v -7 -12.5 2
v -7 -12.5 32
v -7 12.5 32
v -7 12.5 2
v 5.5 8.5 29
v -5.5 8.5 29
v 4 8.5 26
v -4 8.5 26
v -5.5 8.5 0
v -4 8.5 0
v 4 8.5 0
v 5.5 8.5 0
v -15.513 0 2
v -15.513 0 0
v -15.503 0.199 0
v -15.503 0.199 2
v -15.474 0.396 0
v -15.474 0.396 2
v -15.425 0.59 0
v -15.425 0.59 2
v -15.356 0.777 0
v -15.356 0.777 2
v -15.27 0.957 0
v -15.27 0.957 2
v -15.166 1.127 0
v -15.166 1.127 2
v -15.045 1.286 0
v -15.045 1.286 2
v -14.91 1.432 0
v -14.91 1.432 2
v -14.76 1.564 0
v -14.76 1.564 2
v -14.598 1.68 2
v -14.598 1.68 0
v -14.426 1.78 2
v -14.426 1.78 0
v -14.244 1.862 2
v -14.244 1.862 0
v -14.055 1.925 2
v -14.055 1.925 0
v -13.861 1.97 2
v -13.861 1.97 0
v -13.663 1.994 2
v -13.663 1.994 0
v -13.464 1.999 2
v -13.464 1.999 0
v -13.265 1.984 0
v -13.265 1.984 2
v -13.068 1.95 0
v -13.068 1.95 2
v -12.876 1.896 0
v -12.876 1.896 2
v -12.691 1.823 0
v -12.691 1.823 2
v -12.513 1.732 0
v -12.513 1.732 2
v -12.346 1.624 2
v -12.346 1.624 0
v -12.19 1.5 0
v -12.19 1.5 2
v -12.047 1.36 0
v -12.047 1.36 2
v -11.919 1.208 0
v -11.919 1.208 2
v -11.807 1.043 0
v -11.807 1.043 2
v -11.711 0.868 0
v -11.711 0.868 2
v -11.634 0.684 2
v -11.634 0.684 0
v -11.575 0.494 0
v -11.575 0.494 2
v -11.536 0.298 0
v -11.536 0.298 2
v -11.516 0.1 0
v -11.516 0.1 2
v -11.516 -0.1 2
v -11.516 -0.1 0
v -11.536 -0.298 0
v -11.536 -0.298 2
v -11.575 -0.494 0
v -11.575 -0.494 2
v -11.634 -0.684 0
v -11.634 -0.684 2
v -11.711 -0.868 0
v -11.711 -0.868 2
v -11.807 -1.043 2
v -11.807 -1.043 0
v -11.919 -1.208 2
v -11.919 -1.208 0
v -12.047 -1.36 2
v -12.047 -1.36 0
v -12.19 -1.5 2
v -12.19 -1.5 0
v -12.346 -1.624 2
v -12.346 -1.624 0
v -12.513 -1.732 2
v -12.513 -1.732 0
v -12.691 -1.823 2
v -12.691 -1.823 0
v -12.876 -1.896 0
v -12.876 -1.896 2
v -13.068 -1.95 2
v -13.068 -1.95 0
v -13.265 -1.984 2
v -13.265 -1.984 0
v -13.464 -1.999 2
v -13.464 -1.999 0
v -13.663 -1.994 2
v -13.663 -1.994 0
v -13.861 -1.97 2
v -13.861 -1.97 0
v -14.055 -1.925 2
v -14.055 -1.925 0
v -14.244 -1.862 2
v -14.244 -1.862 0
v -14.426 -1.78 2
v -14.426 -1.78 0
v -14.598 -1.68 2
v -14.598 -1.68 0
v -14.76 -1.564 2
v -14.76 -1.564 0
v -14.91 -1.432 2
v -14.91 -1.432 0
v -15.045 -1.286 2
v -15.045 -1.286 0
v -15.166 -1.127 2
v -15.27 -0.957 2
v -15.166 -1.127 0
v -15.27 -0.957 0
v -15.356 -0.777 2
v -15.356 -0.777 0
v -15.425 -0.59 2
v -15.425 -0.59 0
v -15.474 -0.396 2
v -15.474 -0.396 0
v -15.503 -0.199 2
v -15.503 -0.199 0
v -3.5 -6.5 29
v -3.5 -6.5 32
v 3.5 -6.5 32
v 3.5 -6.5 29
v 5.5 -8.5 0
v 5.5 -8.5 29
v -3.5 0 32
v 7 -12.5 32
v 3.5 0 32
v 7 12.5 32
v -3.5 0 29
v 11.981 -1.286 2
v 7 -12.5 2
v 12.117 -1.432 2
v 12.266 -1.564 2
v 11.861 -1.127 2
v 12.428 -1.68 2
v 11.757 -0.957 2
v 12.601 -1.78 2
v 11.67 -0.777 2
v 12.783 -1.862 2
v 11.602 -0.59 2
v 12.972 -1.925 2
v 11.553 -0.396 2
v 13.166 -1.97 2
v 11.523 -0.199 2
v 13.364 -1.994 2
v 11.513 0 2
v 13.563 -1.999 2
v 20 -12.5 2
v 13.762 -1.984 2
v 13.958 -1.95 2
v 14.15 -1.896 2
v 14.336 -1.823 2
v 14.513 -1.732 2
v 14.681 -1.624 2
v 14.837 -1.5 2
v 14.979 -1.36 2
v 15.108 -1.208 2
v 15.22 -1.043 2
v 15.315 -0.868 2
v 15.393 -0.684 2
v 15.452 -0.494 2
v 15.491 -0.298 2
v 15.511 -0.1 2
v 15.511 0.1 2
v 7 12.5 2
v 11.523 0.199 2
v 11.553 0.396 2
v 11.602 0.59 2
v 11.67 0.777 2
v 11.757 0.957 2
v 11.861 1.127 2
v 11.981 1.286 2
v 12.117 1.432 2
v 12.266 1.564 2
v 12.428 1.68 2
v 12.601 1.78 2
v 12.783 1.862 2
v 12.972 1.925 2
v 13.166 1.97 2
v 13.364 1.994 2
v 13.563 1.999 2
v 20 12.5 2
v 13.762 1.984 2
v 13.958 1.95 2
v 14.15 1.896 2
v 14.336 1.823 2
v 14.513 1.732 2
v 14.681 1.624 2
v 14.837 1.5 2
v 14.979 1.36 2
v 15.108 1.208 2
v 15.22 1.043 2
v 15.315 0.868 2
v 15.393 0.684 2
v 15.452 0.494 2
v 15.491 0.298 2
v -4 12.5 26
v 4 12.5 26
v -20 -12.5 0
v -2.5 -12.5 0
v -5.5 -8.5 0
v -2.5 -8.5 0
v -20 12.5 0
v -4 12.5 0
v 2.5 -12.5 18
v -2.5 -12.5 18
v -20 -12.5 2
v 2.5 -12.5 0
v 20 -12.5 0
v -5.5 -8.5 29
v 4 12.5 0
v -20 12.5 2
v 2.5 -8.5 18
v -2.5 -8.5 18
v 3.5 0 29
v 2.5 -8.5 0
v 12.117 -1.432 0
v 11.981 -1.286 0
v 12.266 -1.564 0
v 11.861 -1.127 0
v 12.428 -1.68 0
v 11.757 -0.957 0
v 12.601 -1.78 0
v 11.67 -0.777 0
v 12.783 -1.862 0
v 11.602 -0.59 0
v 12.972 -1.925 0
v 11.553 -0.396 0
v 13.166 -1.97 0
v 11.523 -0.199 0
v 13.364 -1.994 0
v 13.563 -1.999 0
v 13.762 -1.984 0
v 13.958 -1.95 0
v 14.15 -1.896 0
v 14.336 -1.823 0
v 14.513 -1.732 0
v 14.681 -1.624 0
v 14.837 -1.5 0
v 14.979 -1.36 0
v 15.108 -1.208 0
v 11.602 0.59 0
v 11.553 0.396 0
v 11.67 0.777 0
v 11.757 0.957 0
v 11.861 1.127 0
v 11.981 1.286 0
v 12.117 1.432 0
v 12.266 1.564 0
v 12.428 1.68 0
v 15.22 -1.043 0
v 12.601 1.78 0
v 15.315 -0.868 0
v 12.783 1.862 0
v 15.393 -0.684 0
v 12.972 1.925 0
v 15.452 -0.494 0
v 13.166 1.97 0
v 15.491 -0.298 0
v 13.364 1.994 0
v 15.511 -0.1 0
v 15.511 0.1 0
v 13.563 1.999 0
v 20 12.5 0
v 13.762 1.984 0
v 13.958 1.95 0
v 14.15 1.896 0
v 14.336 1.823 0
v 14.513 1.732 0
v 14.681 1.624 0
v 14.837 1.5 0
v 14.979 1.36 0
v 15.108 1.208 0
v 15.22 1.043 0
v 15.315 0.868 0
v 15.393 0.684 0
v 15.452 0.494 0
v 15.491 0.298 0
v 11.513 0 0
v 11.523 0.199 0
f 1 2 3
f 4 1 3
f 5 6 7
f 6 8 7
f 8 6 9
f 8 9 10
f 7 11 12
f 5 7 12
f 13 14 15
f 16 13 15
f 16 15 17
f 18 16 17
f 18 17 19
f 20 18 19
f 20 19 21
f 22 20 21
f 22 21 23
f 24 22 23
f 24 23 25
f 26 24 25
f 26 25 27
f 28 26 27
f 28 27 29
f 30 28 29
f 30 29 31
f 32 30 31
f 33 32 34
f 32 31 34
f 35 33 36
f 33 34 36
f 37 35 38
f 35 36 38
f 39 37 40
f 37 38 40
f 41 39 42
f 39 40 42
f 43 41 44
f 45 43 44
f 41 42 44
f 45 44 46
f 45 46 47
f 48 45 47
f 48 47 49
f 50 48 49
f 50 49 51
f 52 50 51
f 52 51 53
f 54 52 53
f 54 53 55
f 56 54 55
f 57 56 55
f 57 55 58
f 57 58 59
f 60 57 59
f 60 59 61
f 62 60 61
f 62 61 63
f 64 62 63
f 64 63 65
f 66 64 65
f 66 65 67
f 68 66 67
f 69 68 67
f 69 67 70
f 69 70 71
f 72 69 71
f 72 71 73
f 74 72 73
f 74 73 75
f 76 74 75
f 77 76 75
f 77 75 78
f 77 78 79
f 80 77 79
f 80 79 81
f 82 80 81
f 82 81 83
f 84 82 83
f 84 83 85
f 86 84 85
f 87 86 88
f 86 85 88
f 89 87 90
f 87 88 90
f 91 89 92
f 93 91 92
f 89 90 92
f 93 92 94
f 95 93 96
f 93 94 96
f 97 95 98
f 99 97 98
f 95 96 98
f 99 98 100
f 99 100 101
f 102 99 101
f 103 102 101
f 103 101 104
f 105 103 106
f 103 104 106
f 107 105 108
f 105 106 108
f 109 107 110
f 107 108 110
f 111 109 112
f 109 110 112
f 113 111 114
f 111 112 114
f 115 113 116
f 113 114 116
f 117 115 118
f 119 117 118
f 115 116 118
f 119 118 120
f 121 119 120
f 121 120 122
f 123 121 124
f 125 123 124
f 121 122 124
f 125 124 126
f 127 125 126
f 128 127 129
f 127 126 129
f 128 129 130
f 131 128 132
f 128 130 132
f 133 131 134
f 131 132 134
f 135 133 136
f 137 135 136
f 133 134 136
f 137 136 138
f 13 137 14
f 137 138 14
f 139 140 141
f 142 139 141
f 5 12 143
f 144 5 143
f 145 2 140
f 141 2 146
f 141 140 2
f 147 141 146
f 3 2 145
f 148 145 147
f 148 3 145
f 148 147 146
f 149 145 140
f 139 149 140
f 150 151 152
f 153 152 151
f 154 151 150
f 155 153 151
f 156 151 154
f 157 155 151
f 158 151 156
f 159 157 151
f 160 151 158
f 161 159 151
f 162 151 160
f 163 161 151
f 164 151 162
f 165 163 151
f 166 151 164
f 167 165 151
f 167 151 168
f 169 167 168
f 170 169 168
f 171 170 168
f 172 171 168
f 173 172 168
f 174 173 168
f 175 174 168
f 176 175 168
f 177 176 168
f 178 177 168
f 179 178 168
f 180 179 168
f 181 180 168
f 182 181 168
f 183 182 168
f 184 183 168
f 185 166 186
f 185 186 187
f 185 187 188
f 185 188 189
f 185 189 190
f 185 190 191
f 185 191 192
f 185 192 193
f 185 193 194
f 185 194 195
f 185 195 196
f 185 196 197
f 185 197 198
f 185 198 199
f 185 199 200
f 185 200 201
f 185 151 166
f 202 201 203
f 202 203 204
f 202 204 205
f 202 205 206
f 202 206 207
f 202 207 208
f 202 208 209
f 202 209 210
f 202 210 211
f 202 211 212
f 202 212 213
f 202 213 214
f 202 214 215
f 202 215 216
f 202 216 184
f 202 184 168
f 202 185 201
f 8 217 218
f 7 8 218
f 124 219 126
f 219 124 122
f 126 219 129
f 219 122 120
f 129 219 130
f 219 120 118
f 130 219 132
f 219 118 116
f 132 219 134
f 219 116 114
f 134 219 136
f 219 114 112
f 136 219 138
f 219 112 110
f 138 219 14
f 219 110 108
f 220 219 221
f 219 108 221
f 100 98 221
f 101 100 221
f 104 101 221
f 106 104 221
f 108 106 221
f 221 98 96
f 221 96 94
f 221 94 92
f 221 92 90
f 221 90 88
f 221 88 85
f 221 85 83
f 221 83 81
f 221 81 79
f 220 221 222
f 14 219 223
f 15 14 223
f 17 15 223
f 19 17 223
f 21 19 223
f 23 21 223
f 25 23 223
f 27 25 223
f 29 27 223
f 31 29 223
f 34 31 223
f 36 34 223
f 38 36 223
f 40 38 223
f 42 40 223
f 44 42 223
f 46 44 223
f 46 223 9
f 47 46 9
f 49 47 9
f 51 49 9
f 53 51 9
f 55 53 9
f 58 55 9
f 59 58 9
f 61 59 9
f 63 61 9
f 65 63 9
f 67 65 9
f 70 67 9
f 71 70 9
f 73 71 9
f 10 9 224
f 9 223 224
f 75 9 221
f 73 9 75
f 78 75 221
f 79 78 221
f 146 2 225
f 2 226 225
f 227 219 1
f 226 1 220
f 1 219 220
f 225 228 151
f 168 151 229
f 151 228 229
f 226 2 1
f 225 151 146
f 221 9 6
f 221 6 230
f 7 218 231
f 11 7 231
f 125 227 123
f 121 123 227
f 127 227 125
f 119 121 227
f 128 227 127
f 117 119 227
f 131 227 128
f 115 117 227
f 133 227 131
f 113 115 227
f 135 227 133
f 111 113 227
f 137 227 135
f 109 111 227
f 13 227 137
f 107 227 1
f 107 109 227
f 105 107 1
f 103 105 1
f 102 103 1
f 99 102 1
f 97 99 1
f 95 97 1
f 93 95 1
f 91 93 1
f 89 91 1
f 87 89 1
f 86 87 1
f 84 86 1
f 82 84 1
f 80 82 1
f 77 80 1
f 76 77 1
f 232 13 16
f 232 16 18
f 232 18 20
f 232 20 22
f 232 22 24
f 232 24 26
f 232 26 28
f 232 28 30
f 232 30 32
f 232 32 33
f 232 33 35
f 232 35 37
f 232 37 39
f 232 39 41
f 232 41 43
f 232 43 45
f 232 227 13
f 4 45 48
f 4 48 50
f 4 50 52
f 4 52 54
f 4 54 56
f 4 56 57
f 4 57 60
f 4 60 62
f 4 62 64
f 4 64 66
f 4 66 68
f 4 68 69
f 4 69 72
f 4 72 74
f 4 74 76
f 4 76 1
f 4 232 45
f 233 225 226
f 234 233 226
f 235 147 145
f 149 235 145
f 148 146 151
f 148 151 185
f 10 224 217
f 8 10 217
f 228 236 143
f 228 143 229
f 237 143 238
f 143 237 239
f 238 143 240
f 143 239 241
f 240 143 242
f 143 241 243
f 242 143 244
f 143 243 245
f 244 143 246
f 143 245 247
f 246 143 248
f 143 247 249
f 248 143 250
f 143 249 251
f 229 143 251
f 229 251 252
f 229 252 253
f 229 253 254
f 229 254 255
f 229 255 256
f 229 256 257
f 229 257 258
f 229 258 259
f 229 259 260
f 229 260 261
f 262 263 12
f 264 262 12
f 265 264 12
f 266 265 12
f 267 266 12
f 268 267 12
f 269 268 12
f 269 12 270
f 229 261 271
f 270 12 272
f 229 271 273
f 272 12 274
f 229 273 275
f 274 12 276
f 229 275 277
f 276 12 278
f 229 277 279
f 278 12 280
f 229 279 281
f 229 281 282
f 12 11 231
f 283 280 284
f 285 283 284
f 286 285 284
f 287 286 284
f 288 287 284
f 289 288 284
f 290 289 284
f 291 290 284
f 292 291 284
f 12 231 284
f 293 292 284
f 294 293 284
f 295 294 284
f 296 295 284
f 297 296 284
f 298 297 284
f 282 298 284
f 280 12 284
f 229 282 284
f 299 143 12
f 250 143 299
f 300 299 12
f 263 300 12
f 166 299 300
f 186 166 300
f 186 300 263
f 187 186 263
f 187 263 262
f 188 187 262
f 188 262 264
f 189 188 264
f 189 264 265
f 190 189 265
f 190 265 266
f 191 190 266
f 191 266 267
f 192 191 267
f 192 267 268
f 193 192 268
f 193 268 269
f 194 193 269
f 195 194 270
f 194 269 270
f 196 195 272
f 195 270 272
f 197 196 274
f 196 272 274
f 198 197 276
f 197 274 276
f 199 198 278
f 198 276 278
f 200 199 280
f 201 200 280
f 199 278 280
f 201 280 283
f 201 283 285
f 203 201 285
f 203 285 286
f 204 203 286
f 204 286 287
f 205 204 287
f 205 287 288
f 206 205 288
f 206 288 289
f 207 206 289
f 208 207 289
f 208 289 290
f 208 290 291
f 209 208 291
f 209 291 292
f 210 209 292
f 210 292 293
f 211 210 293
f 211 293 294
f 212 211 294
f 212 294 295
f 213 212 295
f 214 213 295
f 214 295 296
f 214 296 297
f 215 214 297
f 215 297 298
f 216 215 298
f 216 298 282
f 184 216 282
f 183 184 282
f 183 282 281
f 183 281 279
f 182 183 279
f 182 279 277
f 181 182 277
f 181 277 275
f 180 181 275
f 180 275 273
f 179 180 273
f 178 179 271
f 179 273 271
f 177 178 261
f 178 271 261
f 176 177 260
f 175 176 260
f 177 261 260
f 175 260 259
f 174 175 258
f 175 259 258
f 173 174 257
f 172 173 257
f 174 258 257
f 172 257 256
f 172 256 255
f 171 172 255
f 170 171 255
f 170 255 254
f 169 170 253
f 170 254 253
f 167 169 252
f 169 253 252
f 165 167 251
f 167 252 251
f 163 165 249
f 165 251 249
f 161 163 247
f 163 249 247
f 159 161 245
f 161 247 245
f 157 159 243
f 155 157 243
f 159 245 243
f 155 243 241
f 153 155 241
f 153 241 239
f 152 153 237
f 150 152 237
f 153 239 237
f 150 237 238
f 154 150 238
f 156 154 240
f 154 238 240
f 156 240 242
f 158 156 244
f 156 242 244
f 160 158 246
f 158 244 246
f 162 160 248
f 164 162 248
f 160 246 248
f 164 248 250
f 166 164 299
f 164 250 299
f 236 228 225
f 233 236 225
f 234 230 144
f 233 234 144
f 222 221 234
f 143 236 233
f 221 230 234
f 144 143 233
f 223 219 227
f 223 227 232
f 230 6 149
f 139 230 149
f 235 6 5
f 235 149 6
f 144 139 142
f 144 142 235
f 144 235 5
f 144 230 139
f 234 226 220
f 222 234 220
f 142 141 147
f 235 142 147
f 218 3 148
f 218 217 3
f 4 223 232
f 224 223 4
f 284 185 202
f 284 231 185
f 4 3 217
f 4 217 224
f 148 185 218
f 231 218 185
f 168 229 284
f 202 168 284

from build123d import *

# Parameters (mm, degrees)
F0_W      = 40
F0_H      = 25
F1_DEPTH  = 2
F2_W      = 14
F2_H      = 25
F3_DEPTH  = 30
F5_D      = 4
F6_W      = 11
F6_H      = 17
F7_DEPTH  = 29
F9_DEPTH  = 3
F11_DEPTH = 5
F13_DEPTH = 5


with BuildPart() as f1:
    # F0 (on Top) → F1 (new body)
    with BuildSketch(Plane.XY):
        Rectangle(F0_W, F0_H)
    extrude(amount=F1_DEPTH)

    # F2 (on face) → F3 (join)
    with BuildSketch(Plane.XY.offset(2)):
        Rectangle(F2_W, F2_H)
    extrude(amount=F3_DEPTH)

    # F5 (through all)
    with Locations(Plane.XY.offset(2)):
        with Locations((13.51337, 0), (-13.51337, 0)):
            Hole(F5_D / 2)

    # F6 (on face) → F7 (cut)
    with BuildSketch(Plane(origin=(0, 0, 0), x_dir=(1, 0, 0), z_dir=(0, 0, -1))):
        Rectangle(F6_W, F6_H)
    extrude(amount=-F7_DEPTH, mode=Mode.SUBTRACT)

    # F8 (on face) → F9 (cut)
    with BuildSketch(Plane.XY.offset(32)):
        Polygon((-3.5, -6.5), (0, -6.5), (3.5, -6.5), (3.5, 0), (-3.5, 0), align=None)
    extrude(amount=-F9_DEPTH, mode=Mode.SUBTRACT)

    # F10 (on face) → F11 (cut)
    with BuildSketch(Plane.XZ.offset(12.5)):
        Polygon((-2.5, 0), (0, 0), (2.5, 0), (2.5, 18), (-2.5, 18), align=None)
    extrude(amount=-F11_DEPTH, mode=Mode.SUBTRACT)

    # F12 (on face) → F13 (cut)
    with BuildSketch(Plane(origin=(0, 12.5, 0), x_dir=(-1, 0, 0), z_dir=(0, 1, 0))):
        Polygon((-4, 0), (0, 0), (4, 0), (4, 26), (0, 26), (-4, 26), align=None)
    extrude(amount=-F13_DEPTH, mode=Mode.SUBTRACT)


solid = f1.part
